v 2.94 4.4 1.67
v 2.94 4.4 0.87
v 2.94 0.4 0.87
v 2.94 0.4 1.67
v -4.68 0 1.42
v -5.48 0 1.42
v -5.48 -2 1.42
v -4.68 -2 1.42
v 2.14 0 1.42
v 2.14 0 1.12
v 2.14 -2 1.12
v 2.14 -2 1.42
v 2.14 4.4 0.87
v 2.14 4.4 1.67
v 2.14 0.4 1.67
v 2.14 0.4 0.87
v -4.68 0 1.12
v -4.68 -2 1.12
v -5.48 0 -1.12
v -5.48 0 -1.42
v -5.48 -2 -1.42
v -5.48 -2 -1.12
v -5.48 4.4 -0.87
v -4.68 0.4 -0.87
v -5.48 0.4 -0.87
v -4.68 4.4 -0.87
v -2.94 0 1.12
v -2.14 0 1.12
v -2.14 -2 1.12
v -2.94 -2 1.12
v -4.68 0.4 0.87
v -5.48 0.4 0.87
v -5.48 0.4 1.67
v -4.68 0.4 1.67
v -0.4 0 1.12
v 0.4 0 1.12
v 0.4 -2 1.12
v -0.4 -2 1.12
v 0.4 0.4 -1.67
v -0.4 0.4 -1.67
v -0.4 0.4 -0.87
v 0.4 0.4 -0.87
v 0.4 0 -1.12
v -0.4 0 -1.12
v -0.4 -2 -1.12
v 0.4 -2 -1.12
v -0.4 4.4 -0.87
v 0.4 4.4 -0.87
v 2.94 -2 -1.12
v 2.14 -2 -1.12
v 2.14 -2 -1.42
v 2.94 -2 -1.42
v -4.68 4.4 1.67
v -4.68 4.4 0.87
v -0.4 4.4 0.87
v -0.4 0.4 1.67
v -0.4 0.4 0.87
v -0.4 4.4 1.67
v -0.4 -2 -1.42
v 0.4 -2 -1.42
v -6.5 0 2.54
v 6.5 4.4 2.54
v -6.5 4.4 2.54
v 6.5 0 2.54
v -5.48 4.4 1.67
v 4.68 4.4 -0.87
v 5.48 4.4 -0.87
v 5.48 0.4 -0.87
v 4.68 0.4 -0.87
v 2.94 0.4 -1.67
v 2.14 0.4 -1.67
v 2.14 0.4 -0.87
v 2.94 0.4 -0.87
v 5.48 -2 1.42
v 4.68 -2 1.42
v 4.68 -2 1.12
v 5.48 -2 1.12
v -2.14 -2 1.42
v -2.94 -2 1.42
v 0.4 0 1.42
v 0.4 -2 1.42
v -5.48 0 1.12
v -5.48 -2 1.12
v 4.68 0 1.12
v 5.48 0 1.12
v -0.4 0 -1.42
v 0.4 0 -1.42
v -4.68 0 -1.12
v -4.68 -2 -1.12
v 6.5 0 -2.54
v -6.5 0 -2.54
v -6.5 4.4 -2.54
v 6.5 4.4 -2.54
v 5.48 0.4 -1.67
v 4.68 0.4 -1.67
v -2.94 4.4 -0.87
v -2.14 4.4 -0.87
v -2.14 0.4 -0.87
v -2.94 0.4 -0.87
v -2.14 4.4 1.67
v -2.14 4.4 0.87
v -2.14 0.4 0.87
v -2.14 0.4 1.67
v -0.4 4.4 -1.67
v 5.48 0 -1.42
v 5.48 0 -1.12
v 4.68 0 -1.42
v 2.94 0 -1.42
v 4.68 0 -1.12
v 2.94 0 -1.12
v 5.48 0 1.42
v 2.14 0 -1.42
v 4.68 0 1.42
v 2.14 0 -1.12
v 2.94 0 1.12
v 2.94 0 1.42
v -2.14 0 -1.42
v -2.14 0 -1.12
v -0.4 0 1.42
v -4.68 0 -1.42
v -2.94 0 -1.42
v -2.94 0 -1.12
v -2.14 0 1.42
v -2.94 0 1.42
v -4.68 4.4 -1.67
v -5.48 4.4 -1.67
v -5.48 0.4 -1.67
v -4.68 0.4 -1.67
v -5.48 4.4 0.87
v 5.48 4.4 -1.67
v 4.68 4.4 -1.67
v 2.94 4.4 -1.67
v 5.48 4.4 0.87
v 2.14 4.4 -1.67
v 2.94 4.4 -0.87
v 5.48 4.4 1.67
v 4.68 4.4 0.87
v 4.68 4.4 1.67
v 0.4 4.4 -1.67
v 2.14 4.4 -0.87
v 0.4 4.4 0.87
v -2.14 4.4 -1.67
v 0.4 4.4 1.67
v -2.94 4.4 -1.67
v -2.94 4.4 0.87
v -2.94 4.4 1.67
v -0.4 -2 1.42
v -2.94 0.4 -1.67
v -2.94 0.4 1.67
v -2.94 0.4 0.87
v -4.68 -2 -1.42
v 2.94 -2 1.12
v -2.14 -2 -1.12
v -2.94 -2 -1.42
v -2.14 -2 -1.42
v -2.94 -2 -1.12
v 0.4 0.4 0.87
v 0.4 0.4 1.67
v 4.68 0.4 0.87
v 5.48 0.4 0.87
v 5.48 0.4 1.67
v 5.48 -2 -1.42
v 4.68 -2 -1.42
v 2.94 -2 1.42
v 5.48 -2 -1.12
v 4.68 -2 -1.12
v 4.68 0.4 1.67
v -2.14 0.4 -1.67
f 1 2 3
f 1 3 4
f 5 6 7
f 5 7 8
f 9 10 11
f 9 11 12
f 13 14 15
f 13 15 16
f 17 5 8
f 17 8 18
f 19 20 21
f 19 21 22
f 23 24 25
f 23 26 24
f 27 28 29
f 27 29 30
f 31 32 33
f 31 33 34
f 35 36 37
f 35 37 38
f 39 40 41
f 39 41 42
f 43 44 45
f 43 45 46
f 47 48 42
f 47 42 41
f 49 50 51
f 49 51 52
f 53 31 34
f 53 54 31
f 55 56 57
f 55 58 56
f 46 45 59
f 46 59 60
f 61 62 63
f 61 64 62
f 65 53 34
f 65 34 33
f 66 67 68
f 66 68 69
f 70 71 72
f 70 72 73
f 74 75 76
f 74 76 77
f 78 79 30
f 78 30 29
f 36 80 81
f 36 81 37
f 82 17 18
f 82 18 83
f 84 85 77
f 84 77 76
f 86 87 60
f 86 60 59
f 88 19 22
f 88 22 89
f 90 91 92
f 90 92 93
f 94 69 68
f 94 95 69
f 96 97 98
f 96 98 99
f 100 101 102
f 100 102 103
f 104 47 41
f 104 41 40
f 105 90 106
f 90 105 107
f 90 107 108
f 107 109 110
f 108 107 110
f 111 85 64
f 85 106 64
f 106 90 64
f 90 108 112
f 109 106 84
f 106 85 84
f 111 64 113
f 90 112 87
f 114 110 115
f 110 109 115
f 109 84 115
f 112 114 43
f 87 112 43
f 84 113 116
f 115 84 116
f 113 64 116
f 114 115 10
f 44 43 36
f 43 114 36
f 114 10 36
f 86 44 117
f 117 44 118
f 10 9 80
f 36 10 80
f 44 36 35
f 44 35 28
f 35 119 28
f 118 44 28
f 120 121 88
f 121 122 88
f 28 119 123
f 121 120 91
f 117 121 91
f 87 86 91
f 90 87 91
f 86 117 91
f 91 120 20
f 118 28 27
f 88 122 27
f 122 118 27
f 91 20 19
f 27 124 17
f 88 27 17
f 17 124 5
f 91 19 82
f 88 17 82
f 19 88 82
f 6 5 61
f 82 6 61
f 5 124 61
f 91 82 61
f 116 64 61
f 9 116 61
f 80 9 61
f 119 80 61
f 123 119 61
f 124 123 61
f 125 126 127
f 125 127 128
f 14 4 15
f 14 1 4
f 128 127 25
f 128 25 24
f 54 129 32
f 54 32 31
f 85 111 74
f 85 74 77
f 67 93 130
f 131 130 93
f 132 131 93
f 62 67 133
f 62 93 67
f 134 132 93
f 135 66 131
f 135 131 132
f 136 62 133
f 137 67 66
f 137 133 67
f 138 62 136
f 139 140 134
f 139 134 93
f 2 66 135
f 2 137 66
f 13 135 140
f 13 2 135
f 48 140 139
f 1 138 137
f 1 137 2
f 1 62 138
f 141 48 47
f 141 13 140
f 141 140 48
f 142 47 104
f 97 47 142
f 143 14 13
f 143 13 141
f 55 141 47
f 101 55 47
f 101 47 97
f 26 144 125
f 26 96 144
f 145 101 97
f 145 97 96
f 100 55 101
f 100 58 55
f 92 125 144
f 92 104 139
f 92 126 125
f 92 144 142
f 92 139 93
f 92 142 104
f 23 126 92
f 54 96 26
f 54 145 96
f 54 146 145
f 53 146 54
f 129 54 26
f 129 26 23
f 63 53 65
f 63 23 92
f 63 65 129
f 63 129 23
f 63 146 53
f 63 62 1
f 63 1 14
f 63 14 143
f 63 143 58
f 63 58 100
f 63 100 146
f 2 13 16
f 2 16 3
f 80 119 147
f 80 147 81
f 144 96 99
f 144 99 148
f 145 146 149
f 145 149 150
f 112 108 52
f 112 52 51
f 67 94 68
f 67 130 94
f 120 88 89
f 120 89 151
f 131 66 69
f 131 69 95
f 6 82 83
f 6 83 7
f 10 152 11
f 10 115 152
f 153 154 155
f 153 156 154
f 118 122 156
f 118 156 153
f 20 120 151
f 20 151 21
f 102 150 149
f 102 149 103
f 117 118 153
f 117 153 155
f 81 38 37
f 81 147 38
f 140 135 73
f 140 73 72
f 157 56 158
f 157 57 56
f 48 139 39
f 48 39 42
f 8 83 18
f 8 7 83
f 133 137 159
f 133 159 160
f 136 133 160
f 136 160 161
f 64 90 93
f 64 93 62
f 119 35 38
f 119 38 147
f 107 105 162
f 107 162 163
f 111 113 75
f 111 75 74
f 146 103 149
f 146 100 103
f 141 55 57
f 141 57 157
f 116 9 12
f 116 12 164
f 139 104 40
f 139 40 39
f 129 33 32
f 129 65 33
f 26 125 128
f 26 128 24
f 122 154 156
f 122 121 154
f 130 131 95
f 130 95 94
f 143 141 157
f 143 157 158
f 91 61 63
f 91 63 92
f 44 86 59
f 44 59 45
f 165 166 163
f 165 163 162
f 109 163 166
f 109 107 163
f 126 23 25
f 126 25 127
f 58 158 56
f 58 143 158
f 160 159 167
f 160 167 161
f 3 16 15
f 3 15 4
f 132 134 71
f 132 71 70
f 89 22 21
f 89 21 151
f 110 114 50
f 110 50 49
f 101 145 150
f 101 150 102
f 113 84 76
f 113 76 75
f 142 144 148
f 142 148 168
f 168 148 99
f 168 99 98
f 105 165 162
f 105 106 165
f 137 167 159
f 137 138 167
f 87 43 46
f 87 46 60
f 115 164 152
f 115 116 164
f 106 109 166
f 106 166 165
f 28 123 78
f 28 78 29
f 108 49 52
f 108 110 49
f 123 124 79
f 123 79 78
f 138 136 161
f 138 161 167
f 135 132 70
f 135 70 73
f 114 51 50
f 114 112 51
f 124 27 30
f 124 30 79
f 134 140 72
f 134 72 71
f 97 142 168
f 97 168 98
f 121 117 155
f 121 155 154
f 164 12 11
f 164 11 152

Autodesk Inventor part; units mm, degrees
ref_plane "YZ Plane" through (0, 0, 0) normal (1, 0, 0) x (0, 1, 0)
ref_plane "XZ Plane" through (0, 0, 0) normal (0, 1, 0) x (-1, 0, 0)
ref_plane "XY Plane" through (0, 0, 0) normal (0, 0, 1) x (1, 0, 0)
sketch "Эскиз1" plane through (0, 0, 0) normal (0, 1, 0) x (-1, 0, 0)
  line L0 (6.5, -2.54) -> (-6.5, -2.54)
  line L1 (-6.5, -2.54) -> (-6.5, 2.54)
  line L2 (-6.5, 2.54) -> (6.5, 2.54)
  line L3 (6.5, 2.54) -> (6.5, -2.54)
  line L4 (0, -3.556) -> (0, 3.556) projected
  line L5 (9.1, 0) -> (-9.1, 0) projected
  point P0 (0, 0)
  dimension "d0" = 13
  dimension "d1" = 5.08
extrude "Выдавливание1" add sketch "Эскиз1" along normal blind 4.4
sketch "Эскиз2" plane through (0, 4.4, 0) normal (0, 1, 0) x (1, 0, 0)
  line L0 (-5.48, 1.67) -> (-4.68, 1.67)
  line L1 (-4.68, 1.67) -> (-4.68, 0.87)
  line L2 (-4.68, 0.87) -> (-5.48, 0.87)
  line L3 (-5.48, 0.87) -> (-5.48, 1.67)
  line L4 (-2.94, 1.67) -> (-2.14, 1.67)
  line L5 (-2.14, 1.67) -> (-2.14, 0.87)
  line L6 (-2.14, 0.87) -> (-2.94, 0.87)
  line L7 (-2.94, 0.87) -> (-2.94, 1.67)
  line L8 (-0.4, 1.67) -> (0.4, 1.67)
  line L9 (0.4, 1.67) -> (0.4, 0.87)
  line L10 (0.4, 0.87) -> (-0.4, 0.87)
  line L11 (-0.4, 0.87) -> (-0.4, 1.67)
  line L12 (2.14, 1.67) -> (2.94, 1.67)
  line L13 (2.94, 1.67) -> (2.94, 0.87)
  line L14 (2.94, 0.87) -> (2.14, 0.87)
  line L15 (2.14, 0.87) -> (2.14, 1.67)
  line L16 (4.68, 1.67) -> (5.48, 1.67)
  line L17 (5.48, 1.67) -> (5.48, 0.87)
  line L18 (5.48, 0.87) -> (4.68, 0.87)
  line L19 (4.68, 0.87) -> (4.68, 1.67)
  line L20 (-5.48, -0.87) -> (-4.68, -0.87)
  line L21 (-4.68, -0.87) -> (-4.68, -1.67)
  line L22 (-4.68, -1.67) -> (-5.48, -1.67)
  line L23 (-5.48, -1.67) -> (-5.48, -0.87)
  line L24 (-2.94, -0.87) -> (-2.14, -0.87)
  line L25 (-2.14, -0.87) -> (-2.14, -1.67)
  line L26 (-2.14, -1.67) -> (-2.94, -1.67)
  line L27 (-2.94, -1.67) -> (-2.94, -0.87)
  line L28 (-0.4, -0.87) -> (0.4, -0.87)
  line L29 (0.4, -0.87) -> (0.4, -1.67)
  line L30 (0.4, -1.67) -> (-0.4, -1.67)
  line L31 (-0.4, -1.67) -> (-0.4, -0.87)
  line L32 (2.14, -0.87) -> (2.94, -0.87)
  line L33 (2.94, -0.87) -> (2.94, -1.67)
  line L34 (2.94, -1.67) -> (2.14, -1.67)
  line L35 (2.14, -1.67) -> (2.14, -0.87)
  line L36 (4.68, -0.87) -> (5.48, -0.87)
  line L37 (5.48, -0.87) -> (5.48, -1.67)
  line L38 (5.48, -1.67) -> (4.68, -1.67)
  line L39 (4.68, -1.67) -> (4.68, -0.87)
  line L40 (0, 3.556) -> (0, -3.556) projected
  line L41 (-9.1, 0) -> (9.1, 0) projected
  point P0 (0, 0)
  dimension "d4" = 0.8
  dimension "d5" = 0.8
  dimension "d8" = 2.54
  dimension "d11" = 2.54
extrude "Выдавливание2" cut sketch "Эскиз2" against normal blind 4
sketch "Эскиз3" plane through (0, 0, 0) normal (0, -1, 0) x (1, 0, 0)
  line L0 (0, -3.556) -> (0, 3.556) projected
  line L1 (-9.1, 0) -> (9.1, 0) projected
  line L2 (-5.48, 1.42) -> (-4.68, 1.42)
  line L3 (-4.68, 1.42) -> (-4.68, 1.12)
  line L4 (-4.68, 1.12) -> (-5.48, 1.12)
  line L5 (-5.48, 1.12) -> (-5.48, 1.42)
  line L6 (-2.94, 1.42) -> (-2.14, 1.42)
  line L7 (-2.14, 1.42) -> (-2.14, 1.12)
  line L8 (-2.14, 1.12) -> (-2.94, 1.12)
  line L9 (-2.94, 1.12) -> (-2.94, 1.42)
  line L10 (-0.4, 1.42) -> (0.4, 1.42)
  line L11 (0.4, 1.42) -> (0.4, 1.12)
  line L12 (0.4, 1.12) -> (-0.4, 1.12)
  line L13 (-0.4, 1.12) -> (-0.4, 1.42)
  line L14 (2.14, 1.42) -> (2.94, 1.42)
  line L15 (2.94, 1.42) -> (2.94, 1.12)
  line L16 (2.94, 1.12) -> (2.14, 1.12)
  line L17 (2.14, 1.12) -> (2.14, 1.42)
  line L18 (4.68, 1.42) -> (5.48, 1.42)
  line L19 (5.48, 1.42) -> (5.48, 1.12)
  line L20 (5.48, 1.12) -> (4.68, 1.12)
  line L21 (4.68, 1.12) -> (4.68, 1.42)
  line L22 (-5.48, -1.12) -> (-4.68, -1.12)
  line L23 (-4.68, -1.12) -> (-4.68, -1.42)
  line L24 (-4.68, -1.42) -> (-5.48, -1.42)
  line L25 (-5.48, -1.42) -> (-5.48, -1.12)
  line L26 (-2.94, -1.12) -> (-2.14, -1.12)
  line L27 (-2.14, -1.12) -> (-2.14, -1.42)
  line L28 (-2.14, -1.42) -> (-2.94, -1.42)
  line L29 (-2.94, -1.42) -> (-2.94, -1.12)
  line L30 (-0.4, -1.12) -> (0.4, -1.12)
  line L31 (0.4, -1.12) -> (0.4, -1.42)
  line L32 (0.4, -1.42) -> (-0.4, -1.42)
  line L33 (-0.4, -1.42) -> (-0.4, -1.12)
  line L34 (2.14, -1.12) -> (2.94, -1.12)
  line L35 (2.94, -1.12) -> (2.94, -1.42)
  line L36 (2.94, -1.42) -> (2.14, -1.42)
  line L37 (2.14, -1.42) -> (2.14, -1.12)
  line L38 (4.68, -1.12) -> (5.48, -1.12)
  line L39 (5.48, -1.12) -> (5.48, -1.42)
  line L40 (5.48, -1.42) -> (4.68, -1.42)
  line L41 (4.68, -1.42) -> (4.68, -1.12)
  point P0 (0, 0)
  dimension "d16" = 0.8
  dimension "d17" = 0.3
  dimension "d20" = 2.54
  dimension "d23" = 2.54
extrude "Выдавливание3" add sketch "Эскиз3" along normal blind 2
properties part number "MOLEX"
